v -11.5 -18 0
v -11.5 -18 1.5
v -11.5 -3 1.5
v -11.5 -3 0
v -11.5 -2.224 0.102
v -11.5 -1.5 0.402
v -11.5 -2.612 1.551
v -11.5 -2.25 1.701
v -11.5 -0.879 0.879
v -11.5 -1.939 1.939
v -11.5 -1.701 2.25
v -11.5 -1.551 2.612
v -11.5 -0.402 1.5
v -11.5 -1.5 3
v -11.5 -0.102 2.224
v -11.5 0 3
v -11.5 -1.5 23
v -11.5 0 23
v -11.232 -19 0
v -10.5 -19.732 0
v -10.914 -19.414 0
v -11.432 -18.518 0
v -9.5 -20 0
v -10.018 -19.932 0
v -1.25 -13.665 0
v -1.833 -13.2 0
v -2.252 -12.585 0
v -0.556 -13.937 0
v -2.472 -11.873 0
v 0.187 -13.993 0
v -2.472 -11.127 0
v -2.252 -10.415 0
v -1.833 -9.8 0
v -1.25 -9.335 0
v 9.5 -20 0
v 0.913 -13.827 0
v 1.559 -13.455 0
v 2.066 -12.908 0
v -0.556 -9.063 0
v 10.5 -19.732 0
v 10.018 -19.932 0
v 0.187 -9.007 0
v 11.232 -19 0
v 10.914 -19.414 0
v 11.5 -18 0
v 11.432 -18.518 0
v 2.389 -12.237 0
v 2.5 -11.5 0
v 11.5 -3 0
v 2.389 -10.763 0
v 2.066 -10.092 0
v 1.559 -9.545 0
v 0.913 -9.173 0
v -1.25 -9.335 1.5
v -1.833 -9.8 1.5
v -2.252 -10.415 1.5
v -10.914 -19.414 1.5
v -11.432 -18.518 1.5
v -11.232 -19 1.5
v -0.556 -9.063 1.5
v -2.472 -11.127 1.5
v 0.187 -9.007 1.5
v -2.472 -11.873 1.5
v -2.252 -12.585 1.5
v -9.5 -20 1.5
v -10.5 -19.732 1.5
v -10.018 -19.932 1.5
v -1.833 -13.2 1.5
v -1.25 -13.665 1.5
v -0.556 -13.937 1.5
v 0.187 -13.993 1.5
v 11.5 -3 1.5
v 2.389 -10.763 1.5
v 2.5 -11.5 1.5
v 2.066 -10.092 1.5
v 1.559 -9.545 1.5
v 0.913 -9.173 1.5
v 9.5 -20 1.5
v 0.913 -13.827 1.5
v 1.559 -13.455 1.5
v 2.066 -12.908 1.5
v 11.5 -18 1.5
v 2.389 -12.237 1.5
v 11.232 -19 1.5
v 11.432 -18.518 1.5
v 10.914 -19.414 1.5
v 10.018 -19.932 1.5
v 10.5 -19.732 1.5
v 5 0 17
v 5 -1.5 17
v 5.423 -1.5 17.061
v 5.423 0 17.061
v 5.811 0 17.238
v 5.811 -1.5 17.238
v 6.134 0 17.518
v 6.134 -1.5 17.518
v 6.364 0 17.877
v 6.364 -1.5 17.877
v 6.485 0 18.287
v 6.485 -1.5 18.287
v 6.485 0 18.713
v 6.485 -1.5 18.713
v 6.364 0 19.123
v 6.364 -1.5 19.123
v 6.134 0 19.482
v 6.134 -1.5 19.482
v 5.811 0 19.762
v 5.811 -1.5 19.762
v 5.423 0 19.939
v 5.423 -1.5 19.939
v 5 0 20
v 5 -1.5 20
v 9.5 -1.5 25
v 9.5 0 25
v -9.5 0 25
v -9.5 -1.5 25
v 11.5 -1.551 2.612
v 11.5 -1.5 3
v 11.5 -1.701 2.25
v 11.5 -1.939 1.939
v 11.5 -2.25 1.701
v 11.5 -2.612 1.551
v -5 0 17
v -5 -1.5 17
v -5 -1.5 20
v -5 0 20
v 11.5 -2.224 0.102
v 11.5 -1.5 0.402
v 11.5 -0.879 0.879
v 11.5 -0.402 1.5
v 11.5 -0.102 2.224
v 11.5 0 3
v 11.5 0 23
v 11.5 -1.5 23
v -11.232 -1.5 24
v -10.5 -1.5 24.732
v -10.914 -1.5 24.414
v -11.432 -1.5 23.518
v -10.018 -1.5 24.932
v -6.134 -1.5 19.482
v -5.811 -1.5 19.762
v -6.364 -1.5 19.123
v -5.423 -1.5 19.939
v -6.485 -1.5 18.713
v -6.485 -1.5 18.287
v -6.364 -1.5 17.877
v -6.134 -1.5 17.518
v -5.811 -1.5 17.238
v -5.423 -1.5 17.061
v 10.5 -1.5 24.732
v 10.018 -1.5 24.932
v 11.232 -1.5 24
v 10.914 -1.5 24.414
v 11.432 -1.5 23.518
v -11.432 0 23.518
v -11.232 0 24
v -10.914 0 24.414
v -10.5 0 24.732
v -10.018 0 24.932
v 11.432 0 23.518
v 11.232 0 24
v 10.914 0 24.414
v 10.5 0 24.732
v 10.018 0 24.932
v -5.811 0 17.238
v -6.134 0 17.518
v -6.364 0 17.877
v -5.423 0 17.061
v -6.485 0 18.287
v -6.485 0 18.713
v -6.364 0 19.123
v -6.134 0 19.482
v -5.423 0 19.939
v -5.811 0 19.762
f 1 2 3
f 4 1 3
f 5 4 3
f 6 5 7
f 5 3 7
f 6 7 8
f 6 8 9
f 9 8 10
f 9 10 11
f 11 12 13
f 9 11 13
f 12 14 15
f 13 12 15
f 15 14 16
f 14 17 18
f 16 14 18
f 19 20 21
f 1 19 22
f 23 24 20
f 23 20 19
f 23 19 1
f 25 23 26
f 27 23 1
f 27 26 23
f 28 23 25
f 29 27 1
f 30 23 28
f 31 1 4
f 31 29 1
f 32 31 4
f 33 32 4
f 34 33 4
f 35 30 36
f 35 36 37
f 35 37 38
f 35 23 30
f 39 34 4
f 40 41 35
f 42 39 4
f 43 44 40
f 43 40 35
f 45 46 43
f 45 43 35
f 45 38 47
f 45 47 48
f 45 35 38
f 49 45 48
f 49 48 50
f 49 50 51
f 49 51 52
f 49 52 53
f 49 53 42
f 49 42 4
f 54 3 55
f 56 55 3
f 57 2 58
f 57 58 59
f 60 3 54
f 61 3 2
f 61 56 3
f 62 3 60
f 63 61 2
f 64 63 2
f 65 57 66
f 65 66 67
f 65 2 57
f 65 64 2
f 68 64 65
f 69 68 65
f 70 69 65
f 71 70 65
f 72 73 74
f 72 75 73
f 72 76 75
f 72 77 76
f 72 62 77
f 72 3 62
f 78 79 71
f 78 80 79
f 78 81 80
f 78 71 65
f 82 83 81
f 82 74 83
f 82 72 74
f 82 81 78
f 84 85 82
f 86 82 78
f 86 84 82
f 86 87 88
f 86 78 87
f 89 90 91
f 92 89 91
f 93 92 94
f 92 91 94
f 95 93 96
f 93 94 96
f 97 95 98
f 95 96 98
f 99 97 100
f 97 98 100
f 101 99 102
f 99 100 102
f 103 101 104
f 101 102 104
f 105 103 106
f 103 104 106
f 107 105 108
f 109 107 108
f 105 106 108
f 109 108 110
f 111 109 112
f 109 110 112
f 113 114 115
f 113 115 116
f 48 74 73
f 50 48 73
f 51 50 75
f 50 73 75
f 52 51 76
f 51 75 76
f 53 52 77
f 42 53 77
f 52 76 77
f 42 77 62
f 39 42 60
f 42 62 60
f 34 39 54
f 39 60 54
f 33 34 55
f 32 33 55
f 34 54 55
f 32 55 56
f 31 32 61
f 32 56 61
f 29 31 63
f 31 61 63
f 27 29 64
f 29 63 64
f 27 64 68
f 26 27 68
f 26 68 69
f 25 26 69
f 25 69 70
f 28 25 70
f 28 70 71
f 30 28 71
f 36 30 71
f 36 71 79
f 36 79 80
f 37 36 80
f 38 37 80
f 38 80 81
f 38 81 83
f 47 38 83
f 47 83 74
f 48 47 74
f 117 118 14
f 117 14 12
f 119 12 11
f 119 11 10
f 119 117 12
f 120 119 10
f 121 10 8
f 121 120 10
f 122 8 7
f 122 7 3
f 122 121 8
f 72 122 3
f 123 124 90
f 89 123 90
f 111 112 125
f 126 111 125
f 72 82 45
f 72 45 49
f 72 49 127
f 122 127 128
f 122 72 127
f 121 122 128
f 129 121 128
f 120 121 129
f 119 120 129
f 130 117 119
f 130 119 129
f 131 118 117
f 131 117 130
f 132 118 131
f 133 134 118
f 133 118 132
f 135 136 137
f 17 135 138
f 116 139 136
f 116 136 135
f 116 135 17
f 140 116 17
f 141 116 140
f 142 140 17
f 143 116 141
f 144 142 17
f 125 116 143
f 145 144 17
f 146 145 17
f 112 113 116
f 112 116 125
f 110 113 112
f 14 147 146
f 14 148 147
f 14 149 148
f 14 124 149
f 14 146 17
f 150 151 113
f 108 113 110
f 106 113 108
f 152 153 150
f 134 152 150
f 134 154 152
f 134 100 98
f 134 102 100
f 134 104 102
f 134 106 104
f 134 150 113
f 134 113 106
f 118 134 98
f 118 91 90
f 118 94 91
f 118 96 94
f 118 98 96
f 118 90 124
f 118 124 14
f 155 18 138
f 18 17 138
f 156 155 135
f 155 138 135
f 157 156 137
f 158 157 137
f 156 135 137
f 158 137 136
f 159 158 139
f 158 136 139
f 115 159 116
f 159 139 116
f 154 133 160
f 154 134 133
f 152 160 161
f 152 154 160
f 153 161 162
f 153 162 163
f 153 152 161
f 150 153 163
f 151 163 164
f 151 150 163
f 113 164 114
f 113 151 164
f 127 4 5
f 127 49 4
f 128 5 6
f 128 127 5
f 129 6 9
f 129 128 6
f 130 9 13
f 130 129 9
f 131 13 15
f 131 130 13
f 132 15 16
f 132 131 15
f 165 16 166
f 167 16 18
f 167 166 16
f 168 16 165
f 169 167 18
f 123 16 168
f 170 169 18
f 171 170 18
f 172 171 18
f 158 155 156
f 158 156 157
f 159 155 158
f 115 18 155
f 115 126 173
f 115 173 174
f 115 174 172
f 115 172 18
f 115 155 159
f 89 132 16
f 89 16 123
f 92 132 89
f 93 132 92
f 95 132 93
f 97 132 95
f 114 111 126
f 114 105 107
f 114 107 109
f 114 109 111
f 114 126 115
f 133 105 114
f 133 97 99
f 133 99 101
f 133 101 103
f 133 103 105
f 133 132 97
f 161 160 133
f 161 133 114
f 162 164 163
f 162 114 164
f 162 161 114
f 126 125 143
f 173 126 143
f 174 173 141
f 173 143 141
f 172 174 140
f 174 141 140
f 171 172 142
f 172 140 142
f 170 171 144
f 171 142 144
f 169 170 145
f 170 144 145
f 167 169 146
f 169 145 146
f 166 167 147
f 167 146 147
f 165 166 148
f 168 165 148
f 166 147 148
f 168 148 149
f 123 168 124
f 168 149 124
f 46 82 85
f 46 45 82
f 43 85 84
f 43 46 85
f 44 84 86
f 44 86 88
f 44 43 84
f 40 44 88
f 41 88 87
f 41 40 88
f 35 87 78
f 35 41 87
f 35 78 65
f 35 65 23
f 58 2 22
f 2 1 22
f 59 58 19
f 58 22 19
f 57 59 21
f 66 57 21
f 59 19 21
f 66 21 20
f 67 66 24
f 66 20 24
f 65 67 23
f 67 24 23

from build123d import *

# Parameters (mm, degrees)
F1_DEPTH = 11.5
F2_R     = 2.5
F3_DEPTH = 25
F5_DEPTH = 25
F6_R     = 2


with BuildPart() as f1:
    # F0 (on Right) → F1 (new body, symmetric)
    with BuildSketch(Plane.YZ):
        with BuildLine():
            ThreePointArc((-3, 0), (-0.87868, 0.87868), (0, 3))
            Line((0, 3), (0, 25))
            Line((0, 25), (-1.5, 25))
            Line((-1.5, 25), (-1.5, 3))
            ThreePointArc((-1.5, 3), (-1.93934, 1.93934), (-3, 1.5))
            Line((-3, 1.5), (-20, 1.5))
            Line((-20, 1.5), (-20, 0))
            Line((-20, 0), (-3, 0))
        make_face()
    extrude(amount=F1_DEPTH, both=True)

    # F2 (on face) → F3 (cut)
    with BuildSketch(Plane.XY.offset(1.5)):
        with Locations((0, -11.5)):
            Circle(F2_R)
    extrude(amount=-F3_DEPTH, mode=Mode.SUBTRACT)

    # F4 (on face) → F5 (cut)
    with BuildSketch(Plane.XZ.offset(1.5)):
        with BuildLine():
            Line((5, 20), (-5, 20))
            ThreePointArc((-5, 20), (-6.5, 18.5), (-5, 17))
            Line((-5, 17), (5, 17))
            ThreePointArc((5, 17), (6.5, 18.5), (5, 20))
        make_face()
    extrude(amount=-F5_DEPTH, mode=Mode.SUBTRACT)

    # F6
    f6_edges = [f1.edges().sort_by_distance(p)[0] for p in [
        (11.5, -0.75, 25),
        (-11.5, -0.75, 25),
        (11.5, -20, 0.75),
        (-11.5, -20, 0.75),
    ]]
    fillet(f6_edges, radius=F6_R)


solid = f1.part
